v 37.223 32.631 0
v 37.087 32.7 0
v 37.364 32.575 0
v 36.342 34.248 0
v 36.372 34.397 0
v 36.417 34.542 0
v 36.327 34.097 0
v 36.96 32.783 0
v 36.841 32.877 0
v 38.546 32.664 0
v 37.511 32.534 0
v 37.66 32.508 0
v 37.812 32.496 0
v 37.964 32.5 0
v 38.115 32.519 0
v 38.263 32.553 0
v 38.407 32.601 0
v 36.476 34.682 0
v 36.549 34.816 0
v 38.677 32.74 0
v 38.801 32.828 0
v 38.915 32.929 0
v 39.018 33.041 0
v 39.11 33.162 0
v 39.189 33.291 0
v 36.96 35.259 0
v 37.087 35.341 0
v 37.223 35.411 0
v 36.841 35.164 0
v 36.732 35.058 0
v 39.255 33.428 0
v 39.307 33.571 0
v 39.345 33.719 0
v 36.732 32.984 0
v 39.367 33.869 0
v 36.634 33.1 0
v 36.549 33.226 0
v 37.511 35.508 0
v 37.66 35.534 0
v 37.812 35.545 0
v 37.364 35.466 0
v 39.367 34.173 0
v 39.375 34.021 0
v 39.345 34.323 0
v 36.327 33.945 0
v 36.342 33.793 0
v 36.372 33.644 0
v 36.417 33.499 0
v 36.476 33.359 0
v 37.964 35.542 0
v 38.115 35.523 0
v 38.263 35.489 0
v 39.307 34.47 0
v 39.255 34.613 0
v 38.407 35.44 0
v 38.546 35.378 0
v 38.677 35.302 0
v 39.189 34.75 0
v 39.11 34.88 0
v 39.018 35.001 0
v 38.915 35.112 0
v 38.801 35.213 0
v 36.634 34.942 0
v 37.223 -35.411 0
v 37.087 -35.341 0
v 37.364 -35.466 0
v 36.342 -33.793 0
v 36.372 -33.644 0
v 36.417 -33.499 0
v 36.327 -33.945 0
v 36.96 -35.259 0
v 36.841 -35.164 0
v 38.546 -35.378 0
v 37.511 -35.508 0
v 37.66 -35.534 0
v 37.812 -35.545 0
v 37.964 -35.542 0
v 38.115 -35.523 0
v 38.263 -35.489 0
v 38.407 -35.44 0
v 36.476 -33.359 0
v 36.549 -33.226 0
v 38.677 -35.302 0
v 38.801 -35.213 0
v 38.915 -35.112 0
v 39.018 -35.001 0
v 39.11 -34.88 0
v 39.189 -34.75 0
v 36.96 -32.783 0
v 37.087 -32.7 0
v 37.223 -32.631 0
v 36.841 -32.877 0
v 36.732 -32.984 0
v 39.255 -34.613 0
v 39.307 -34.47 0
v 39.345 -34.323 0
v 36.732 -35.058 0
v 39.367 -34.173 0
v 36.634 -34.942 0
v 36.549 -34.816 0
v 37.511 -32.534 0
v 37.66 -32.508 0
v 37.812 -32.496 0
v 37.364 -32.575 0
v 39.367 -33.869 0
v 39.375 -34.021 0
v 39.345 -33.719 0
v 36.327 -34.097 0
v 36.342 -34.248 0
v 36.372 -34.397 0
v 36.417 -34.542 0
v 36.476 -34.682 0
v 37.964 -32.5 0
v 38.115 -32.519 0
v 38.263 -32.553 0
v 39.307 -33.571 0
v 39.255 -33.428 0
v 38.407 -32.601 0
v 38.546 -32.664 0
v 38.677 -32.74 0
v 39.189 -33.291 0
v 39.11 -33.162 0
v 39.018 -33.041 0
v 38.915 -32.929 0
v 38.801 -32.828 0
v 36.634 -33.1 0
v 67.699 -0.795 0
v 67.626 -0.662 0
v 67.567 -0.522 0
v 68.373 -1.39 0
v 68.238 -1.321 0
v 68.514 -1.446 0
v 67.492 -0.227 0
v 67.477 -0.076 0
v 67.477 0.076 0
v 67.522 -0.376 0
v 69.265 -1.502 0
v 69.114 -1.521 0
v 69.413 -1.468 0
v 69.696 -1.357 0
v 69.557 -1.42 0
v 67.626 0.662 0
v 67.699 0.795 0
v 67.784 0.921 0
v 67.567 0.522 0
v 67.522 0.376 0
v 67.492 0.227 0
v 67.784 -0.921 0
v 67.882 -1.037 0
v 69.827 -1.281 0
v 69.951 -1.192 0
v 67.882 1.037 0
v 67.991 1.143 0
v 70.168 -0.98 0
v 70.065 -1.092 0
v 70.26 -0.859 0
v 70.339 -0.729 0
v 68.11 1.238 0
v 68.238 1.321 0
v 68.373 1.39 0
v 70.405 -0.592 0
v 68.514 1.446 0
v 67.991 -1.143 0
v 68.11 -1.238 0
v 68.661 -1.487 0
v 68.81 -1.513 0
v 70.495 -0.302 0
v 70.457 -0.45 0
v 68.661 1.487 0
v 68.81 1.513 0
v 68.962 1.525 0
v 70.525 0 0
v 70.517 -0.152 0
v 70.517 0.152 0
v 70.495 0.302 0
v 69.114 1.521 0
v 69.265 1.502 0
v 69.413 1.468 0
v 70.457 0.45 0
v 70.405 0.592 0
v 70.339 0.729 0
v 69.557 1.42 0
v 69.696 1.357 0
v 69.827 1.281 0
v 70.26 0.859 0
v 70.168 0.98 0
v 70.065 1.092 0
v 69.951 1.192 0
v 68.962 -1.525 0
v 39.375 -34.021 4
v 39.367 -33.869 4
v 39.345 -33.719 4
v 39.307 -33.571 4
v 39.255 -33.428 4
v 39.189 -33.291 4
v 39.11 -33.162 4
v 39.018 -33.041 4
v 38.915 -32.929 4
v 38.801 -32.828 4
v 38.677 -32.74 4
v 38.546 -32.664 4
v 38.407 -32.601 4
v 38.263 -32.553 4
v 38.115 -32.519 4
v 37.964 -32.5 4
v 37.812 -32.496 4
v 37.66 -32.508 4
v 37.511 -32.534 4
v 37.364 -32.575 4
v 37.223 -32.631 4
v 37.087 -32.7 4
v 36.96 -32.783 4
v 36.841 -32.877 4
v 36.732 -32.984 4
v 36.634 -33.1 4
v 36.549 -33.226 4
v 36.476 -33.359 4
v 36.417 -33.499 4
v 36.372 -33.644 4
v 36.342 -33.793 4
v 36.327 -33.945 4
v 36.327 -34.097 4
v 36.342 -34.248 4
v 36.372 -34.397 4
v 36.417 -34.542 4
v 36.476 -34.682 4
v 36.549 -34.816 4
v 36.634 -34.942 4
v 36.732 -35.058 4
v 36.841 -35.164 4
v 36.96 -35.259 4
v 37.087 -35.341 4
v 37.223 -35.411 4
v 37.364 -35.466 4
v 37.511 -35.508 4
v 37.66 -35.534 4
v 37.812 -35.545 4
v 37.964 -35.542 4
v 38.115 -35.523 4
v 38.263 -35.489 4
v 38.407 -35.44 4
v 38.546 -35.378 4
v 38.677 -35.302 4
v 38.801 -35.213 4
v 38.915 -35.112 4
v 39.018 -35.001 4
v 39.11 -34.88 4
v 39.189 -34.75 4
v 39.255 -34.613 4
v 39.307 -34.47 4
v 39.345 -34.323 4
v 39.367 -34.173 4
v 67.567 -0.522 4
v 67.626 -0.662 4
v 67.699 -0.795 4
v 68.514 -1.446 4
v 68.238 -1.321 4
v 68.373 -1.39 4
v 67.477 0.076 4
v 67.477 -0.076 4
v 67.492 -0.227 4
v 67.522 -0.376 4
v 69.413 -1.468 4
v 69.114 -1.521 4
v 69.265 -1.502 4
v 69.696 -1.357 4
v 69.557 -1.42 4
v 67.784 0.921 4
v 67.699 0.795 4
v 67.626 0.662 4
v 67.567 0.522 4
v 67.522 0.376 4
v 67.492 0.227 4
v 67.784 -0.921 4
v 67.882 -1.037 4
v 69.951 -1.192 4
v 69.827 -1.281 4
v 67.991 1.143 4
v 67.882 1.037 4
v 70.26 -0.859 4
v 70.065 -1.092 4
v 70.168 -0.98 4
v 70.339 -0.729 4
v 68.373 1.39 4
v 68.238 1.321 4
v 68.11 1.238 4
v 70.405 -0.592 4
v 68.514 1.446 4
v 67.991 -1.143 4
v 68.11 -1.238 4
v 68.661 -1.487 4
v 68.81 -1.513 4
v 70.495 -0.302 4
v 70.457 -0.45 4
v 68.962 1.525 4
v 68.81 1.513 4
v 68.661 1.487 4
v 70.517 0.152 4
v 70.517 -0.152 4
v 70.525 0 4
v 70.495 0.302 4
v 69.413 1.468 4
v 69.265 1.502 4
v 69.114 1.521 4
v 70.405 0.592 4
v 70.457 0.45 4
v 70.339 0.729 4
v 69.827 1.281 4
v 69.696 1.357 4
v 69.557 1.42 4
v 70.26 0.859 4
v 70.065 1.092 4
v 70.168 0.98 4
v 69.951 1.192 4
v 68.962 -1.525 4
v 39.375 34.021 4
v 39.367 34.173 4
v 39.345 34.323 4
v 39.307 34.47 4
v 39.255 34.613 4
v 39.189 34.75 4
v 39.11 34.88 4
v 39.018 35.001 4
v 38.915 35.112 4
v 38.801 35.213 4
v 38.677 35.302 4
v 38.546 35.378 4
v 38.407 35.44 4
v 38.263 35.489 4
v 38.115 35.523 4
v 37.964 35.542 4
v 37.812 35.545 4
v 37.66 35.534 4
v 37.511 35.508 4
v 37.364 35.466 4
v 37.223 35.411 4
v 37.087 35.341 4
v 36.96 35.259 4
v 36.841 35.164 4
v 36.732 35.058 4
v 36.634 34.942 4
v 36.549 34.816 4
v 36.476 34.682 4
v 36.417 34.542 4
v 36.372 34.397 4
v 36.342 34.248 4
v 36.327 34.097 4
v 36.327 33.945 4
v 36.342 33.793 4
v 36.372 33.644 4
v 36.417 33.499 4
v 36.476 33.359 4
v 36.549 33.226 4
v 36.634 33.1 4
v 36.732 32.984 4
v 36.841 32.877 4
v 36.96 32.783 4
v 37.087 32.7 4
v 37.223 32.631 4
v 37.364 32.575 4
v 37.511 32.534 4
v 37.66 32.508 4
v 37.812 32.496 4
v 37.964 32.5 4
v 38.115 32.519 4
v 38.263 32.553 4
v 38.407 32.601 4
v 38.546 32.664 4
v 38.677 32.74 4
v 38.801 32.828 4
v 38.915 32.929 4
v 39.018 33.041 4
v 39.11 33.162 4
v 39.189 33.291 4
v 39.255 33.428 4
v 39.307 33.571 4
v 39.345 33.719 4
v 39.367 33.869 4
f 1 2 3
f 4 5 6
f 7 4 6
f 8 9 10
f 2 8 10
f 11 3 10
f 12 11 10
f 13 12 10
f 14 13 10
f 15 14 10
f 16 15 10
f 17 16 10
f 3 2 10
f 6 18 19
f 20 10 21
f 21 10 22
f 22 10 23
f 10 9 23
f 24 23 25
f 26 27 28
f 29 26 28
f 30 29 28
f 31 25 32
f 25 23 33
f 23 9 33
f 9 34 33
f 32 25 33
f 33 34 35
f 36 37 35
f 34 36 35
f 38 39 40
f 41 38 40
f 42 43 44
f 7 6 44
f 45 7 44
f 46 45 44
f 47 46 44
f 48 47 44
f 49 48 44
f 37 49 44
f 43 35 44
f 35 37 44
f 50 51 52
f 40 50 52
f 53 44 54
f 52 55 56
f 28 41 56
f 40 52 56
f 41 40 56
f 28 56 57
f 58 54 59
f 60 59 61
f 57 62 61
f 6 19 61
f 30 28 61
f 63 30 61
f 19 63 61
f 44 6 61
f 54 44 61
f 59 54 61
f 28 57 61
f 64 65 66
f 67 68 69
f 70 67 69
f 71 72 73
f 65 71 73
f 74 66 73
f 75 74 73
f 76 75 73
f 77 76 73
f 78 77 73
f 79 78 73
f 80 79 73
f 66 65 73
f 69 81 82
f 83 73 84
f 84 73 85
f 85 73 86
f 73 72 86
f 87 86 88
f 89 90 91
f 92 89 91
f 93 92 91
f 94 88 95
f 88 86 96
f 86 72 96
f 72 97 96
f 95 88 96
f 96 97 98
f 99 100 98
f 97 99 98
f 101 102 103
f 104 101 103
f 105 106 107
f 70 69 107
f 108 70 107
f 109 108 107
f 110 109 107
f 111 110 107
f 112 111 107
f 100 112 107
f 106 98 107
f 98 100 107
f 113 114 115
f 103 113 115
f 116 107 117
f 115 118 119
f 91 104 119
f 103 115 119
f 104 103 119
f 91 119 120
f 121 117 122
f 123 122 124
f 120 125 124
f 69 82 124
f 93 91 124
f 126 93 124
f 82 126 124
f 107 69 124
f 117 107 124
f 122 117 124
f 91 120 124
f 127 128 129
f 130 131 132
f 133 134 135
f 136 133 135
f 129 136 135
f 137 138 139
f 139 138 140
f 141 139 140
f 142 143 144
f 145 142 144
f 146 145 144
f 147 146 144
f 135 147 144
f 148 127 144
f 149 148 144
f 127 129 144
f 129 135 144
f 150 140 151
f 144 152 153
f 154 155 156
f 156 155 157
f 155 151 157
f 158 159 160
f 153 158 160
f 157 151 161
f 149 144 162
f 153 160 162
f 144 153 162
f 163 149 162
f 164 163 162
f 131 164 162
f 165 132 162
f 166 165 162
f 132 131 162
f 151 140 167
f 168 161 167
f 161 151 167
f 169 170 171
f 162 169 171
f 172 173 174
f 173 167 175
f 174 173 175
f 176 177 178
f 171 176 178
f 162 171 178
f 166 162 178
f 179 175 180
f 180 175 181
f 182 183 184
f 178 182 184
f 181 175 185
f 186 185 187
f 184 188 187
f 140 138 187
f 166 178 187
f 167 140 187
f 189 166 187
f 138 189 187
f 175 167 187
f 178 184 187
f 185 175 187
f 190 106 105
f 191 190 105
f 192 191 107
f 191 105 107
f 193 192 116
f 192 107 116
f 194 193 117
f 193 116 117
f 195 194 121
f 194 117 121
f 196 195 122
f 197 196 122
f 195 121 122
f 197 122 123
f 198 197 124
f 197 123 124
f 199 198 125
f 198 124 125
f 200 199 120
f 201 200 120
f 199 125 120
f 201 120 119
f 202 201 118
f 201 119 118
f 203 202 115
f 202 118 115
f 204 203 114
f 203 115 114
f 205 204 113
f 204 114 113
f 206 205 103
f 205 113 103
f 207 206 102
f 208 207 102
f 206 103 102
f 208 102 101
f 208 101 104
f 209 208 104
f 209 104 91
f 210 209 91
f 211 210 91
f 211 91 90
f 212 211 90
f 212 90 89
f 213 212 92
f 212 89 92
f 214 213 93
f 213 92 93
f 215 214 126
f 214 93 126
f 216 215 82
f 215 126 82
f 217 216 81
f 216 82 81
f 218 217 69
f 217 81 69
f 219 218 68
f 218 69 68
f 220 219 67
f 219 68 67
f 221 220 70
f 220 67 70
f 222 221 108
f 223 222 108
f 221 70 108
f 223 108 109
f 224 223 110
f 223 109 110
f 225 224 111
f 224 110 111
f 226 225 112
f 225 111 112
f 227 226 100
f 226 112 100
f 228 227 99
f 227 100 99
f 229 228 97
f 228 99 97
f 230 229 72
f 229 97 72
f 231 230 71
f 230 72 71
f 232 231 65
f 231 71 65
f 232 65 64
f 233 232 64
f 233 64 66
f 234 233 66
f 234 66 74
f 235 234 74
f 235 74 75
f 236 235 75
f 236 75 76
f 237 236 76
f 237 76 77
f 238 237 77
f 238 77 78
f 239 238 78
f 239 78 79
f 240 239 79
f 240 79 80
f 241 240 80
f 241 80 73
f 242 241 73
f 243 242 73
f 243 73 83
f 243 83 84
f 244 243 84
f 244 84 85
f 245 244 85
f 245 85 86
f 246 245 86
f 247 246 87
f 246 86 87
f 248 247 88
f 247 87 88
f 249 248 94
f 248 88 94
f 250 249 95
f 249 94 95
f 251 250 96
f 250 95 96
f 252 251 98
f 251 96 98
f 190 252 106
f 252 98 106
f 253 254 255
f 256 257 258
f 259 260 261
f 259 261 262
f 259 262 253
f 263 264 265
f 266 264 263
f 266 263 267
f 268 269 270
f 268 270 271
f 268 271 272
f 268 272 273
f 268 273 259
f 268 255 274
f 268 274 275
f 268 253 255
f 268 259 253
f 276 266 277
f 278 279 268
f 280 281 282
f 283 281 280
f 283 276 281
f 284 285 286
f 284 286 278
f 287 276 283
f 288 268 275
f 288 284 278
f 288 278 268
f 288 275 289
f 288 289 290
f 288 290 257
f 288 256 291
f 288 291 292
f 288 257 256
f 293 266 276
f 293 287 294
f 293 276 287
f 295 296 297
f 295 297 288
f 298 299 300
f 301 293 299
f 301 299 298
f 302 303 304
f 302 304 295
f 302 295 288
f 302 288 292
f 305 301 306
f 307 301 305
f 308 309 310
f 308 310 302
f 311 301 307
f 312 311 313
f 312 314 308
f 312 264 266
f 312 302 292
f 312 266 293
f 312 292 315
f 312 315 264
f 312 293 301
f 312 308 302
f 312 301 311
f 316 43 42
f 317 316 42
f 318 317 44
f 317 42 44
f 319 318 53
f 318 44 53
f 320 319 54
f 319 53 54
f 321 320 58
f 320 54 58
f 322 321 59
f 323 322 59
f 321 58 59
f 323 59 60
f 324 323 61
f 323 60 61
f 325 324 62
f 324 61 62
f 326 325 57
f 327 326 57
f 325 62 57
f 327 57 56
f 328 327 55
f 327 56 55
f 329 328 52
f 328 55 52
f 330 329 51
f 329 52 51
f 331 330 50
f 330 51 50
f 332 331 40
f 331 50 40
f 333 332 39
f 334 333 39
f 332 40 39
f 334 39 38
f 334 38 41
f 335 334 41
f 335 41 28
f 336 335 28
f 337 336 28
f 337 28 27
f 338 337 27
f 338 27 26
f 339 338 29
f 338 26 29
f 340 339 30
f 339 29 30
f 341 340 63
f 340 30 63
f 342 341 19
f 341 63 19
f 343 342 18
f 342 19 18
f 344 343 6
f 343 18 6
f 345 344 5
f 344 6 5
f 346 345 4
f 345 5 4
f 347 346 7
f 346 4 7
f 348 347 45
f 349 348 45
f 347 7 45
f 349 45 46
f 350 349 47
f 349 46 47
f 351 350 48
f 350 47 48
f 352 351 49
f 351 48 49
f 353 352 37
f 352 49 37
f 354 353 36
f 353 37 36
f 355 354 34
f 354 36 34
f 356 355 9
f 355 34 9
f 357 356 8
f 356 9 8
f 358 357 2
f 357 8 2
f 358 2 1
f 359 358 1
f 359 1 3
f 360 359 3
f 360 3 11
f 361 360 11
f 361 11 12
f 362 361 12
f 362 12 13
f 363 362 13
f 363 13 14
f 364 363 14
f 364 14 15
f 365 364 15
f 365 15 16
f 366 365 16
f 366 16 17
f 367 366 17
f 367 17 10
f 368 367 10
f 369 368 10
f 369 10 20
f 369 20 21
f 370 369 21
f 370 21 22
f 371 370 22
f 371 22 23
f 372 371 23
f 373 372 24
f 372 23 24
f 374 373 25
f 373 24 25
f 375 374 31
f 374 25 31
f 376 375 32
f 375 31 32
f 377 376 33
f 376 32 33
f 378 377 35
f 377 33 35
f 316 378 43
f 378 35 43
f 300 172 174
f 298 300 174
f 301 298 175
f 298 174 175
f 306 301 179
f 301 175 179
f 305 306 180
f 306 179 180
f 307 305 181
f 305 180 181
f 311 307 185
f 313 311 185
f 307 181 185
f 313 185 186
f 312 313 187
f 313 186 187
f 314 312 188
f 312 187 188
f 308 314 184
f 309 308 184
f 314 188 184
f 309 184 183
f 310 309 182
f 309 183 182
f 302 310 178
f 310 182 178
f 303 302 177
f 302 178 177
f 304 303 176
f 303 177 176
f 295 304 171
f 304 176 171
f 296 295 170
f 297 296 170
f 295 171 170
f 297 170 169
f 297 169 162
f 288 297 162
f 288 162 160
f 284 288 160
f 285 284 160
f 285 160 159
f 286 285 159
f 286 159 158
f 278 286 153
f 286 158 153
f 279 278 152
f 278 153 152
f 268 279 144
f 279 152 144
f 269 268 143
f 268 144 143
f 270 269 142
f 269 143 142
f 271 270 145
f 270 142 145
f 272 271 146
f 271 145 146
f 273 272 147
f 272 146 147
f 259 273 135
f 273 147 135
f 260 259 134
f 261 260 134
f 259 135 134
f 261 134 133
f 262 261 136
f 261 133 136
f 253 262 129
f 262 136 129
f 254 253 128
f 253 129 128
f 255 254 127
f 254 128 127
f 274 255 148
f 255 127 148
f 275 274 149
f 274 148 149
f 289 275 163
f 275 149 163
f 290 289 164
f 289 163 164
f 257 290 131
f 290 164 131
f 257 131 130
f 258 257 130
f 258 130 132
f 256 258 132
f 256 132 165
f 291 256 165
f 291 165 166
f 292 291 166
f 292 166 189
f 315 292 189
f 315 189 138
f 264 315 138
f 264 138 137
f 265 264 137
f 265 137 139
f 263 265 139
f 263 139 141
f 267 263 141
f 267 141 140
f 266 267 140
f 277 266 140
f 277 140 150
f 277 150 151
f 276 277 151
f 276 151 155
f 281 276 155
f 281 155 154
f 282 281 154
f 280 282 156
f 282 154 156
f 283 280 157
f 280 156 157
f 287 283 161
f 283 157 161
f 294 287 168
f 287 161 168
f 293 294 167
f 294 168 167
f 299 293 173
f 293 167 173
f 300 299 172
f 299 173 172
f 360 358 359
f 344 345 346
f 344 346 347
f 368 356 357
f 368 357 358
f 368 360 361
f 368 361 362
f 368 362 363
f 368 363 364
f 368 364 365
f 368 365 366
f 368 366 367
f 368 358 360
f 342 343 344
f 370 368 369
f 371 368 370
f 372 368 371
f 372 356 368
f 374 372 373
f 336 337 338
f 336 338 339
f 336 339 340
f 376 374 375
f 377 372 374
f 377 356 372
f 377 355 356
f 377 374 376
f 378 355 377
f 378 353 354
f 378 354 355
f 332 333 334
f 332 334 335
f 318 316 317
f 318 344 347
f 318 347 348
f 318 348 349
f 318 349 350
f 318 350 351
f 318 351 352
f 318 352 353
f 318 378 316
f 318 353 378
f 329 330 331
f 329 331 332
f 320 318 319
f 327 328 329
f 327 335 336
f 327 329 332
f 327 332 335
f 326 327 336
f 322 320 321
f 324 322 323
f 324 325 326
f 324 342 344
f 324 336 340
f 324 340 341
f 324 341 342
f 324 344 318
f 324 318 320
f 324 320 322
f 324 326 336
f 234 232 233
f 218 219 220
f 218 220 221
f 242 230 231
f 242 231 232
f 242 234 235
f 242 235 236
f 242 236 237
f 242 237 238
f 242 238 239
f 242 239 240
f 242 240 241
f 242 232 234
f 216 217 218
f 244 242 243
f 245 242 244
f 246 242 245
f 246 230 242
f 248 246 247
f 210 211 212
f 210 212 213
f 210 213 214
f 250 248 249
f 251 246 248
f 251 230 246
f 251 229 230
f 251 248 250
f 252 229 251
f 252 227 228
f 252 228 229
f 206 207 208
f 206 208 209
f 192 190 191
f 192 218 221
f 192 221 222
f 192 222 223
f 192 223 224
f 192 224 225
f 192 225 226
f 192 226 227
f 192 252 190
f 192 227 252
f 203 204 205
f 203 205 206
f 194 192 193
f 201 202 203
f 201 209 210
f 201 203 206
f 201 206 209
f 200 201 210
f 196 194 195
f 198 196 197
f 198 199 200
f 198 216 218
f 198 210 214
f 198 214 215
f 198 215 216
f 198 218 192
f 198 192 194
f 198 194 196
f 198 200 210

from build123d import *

# Parameters (mm, degrees)
SKETCH_1_R        = 1.525
EXTRUDE_1_DEPTH   = 4
EXTRUDE_1_2_DEPTH = 4
EXTRUDE_1_3_DEPTH = 4


with BuildPart() as part:
    # 草图1 → 凸台-拉伸1 (new body)
    with BuildSketch(Plane.XY):
        with Locations((37.849897884, 34.020782514)):
            Circle(SKETCH_1_R)
    extrude(amount=EXTRUDE_1_DEPTH)


with BuildPart() as body_2:
    # 草图1 → Extrude 1 2 (new body)
    with BuildSketch(Plane.XY):
        with Locations((69, 0)):
            Circle(SKETCH_1_R)
    extrude(amount=EXTRUDE_1_2_DEPTH)


with BuildPart() as body_3:
    # 草图1 → Extrude 1 3 (new body)
    with BuildSketch(Plane.XY):
        with Locations((37.849897884, -34.020782514)):
            Circle(SKETCH_1_R)
    extrude(amount=EXTRUDE_1_3_DEPTH)


solid = Compound([part.part, body_2.part, body_3.part])
